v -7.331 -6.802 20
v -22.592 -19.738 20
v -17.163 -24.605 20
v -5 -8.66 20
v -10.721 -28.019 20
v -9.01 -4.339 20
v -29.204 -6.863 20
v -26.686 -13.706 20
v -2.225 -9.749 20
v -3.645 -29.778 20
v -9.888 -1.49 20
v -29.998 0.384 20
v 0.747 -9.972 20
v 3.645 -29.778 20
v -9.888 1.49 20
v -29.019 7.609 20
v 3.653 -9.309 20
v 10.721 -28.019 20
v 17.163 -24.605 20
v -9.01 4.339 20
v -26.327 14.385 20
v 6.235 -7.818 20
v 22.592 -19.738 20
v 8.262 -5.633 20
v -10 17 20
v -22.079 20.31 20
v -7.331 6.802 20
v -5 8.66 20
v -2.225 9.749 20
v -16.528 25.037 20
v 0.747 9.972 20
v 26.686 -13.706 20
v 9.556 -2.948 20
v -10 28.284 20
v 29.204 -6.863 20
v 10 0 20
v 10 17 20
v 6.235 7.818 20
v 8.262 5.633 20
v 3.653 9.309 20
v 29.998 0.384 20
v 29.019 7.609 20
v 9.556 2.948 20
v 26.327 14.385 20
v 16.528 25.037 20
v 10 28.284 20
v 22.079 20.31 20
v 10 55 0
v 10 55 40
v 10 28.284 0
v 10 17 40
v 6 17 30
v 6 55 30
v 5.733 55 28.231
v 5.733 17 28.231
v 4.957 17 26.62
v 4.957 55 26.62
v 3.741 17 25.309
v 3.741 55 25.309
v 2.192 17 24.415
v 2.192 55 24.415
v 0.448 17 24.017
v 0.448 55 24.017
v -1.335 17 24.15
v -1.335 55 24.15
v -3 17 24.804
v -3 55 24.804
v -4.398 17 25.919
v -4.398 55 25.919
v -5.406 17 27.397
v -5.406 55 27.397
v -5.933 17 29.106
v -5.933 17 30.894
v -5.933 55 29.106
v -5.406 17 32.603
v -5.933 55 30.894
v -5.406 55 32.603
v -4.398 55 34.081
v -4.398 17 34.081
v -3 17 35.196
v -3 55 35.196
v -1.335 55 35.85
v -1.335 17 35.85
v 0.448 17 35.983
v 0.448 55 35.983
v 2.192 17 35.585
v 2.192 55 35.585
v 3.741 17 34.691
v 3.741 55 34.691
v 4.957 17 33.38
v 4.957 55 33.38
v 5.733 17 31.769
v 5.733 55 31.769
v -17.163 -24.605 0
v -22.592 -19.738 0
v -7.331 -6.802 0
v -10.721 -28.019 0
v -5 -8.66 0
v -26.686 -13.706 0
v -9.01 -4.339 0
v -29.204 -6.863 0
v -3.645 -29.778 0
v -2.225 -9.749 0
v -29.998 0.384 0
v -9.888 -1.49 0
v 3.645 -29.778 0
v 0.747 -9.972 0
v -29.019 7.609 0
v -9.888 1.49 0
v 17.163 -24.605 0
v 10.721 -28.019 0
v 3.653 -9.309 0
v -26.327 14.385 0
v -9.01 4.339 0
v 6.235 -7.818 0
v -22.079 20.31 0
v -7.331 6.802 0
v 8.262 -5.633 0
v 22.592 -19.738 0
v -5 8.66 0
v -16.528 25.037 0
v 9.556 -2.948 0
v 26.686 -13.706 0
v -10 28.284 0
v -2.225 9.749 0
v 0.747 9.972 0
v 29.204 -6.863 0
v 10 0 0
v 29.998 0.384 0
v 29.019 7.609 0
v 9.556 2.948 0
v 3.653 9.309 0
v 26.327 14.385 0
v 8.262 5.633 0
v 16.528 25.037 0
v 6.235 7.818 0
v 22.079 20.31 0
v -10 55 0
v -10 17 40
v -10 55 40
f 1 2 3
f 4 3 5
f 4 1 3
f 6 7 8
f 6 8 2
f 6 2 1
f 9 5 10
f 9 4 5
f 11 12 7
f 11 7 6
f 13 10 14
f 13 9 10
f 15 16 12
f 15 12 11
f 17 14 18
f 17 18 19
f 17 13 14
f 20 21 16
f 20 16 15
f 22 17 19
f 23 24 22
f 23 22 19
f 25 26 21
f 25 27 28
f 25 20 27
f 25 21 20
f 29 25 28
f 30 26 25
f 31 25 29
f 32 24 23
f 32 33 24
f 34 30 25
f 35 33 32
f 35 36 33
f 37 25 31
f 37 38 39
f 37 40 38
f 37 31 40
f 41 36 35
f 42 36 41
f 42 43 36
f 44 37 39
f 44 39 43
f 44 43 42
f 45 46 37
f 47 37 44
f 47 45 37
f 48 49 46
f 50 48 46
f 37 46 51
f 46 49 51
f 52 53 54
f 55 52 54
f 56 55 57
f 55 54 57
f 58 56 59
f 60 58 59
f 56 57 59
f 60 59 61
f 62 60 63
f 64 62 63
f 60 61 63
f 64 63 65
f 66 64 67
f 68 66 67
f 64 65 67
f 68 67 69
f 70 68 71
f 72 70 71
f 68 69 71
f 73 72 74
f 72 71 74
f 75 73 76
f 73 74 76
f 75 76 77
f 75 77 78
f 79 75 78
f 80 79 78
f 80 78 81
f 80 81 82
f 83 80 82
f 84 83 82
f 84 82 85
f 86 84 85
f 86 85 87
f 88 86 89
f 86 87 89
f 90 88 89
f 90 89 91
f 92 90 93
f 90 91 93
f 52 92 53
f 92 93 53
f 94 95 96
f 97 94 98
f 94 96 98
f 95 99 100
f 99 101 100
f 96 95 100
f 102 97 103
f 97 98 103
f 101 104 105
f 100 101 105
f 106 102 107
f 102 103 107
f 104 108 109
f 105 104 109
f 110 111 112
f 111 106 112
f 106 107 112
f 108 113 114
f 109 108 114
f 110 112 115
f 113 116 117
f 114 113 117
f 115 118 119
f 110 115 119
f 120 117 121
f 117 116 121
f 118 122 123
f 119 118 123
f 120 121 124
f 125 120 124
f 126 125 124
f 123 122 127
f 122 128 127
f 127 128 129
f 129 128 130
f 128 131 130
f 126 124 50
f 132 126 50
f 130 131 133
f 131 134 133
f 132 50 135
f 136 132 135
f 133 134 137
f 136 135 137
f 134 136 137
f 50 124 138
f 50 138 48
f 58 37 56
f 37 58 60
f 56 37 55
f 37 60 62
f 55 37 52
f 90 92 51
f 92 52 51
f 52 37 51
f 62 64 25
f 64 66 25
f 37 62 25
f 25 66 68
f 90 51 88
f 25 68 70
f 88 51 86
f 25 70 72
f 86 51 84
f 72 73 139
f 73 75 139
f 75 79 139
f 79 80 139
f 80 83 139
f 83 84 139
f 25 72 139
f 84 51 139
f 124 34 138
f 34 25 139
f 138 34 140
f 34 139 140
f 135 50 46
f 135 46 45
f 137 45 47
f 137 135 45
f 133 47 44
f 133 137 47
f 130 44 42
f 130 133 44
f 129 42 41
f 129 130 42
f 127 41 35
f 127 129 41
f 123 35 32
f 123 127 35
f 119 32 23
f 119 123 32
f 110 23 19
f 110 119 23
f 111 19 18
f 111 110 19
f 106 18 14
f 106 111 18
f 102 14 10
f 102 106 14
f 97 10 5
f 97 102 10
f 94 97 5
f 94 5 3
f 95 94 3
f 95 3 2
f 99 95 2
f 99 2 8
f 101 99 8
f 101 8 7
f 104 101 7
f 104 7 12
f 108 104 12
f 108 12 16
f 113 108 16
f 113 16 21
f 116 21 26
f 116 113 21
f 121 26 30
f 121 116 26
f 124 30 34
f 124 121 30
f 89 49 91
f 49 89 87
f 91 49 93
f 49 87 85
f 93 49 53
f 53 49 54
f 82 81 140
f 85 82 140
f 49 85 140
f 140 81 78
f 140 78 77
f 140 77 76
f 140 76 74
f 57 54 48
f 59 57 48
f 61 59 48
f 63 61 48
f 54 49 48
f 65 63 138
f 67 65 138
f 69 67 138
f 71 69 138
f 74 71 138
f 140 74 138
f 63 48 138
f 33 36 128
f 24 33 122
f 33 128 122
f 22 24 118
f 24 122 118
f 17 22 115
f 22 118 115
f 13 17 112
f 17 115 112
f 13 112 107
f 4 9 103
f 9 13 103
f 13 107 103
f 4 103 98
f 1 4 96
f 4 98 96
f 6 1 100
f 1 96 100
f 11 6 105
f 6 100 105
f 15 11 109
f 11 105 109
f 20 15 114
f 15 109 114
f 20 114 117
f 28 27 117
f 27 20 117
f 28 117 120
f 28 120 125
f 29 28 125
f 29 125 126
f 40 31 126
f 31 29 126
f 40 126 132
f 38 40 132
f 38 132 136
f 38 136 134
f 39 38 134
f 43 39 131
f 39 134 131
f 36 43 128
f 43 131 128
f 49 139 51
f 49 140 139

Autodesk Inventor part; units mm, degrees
ref_plane "YZ Plane" through (0, 0, 0) normal (1, 0, 0) x (0, 1, 0)
ref_plane "XZ Plane" through (0, 0, 0) normal (0, 1, 0) x (-1, 0, 0)
ref_plane "XY Plane" through (0, 0, 0) normal (0, 0, 1) x (1, 0, 0)
sketch "Sketch1" plane through (0, 0, 0) normal (0, 0, 1) x (1, 0, 0)
  circle A0 centre (0, 0) radius 30
  circle A1 centre (0, 0) radius 10
  line L0 (-30, 0) -> (30, 0)
  line L1 (30, 0) -> (30, 20)
  line L2 (30, 20) -> (-30, 20)
  line L3 (-30, 20) -> (-30, 0)
  line L4 (-10, 20) -> (10, 20)
  line L5 (10, 20) -> (10, 55)
  line L6 (10, 55) -> (-10, 55)
  line L7 (-10, 55) -> (-10, 20)
  point P0 (10, 28.2843)
  point P1 (-10, 28.2843)
  dimension "d0" = 60
  dimension "d1" = 20
  dimension "d2" = 20
  dimension "d3" = 20
  dimension "d4" = 35
extrude "Extrusion1" add sketch "Sketch1" along normal blind 40 contours L0 A1 A0 | A0 L2 L0 A1 | A0 L7 L2 | L2 L5 A0 | L7 L6 L5 A0 | A0 L5 L2 L7
sketch "Sketch2" plane through (0, 0, 40) normal (0, 0, 1) x (1, 0, 0)
  circle A0 centre (0, 0) radius 30
  line L0 (10, 55) -> (-10, 55) projected
  line L1 (-10, 55) -> (10, 55)
  line L2 (10, 55) -> (10, 17)
  line L3 (10, 17) -> (-10, 17)
  line L4 (-10, 17) -> (-10, 55)
  circle A1 centre (0, 0) radius 10
  point P0 (-10, 28.2843)
  point P1 (10, 28.2843)
  dimension "d7" = 38
extrude "Extrusion2" cut sketch "Sketch2" against normal blind 20 contours A0 L4 L3 L2 picked at (15.0969, 11.943)
sketch "Sketch3" plane through (-10, 55, 0) normal (0, 1, 0) x (1, 0, 0)
  circle A0 centre (10, -30) radius 6
  point P0 (10, 0)
  dimension "d10" = 12
extrude "Extrusion3" cut sketch "Sketch3" against normal blind 40.325
properties part number "End motor link"
